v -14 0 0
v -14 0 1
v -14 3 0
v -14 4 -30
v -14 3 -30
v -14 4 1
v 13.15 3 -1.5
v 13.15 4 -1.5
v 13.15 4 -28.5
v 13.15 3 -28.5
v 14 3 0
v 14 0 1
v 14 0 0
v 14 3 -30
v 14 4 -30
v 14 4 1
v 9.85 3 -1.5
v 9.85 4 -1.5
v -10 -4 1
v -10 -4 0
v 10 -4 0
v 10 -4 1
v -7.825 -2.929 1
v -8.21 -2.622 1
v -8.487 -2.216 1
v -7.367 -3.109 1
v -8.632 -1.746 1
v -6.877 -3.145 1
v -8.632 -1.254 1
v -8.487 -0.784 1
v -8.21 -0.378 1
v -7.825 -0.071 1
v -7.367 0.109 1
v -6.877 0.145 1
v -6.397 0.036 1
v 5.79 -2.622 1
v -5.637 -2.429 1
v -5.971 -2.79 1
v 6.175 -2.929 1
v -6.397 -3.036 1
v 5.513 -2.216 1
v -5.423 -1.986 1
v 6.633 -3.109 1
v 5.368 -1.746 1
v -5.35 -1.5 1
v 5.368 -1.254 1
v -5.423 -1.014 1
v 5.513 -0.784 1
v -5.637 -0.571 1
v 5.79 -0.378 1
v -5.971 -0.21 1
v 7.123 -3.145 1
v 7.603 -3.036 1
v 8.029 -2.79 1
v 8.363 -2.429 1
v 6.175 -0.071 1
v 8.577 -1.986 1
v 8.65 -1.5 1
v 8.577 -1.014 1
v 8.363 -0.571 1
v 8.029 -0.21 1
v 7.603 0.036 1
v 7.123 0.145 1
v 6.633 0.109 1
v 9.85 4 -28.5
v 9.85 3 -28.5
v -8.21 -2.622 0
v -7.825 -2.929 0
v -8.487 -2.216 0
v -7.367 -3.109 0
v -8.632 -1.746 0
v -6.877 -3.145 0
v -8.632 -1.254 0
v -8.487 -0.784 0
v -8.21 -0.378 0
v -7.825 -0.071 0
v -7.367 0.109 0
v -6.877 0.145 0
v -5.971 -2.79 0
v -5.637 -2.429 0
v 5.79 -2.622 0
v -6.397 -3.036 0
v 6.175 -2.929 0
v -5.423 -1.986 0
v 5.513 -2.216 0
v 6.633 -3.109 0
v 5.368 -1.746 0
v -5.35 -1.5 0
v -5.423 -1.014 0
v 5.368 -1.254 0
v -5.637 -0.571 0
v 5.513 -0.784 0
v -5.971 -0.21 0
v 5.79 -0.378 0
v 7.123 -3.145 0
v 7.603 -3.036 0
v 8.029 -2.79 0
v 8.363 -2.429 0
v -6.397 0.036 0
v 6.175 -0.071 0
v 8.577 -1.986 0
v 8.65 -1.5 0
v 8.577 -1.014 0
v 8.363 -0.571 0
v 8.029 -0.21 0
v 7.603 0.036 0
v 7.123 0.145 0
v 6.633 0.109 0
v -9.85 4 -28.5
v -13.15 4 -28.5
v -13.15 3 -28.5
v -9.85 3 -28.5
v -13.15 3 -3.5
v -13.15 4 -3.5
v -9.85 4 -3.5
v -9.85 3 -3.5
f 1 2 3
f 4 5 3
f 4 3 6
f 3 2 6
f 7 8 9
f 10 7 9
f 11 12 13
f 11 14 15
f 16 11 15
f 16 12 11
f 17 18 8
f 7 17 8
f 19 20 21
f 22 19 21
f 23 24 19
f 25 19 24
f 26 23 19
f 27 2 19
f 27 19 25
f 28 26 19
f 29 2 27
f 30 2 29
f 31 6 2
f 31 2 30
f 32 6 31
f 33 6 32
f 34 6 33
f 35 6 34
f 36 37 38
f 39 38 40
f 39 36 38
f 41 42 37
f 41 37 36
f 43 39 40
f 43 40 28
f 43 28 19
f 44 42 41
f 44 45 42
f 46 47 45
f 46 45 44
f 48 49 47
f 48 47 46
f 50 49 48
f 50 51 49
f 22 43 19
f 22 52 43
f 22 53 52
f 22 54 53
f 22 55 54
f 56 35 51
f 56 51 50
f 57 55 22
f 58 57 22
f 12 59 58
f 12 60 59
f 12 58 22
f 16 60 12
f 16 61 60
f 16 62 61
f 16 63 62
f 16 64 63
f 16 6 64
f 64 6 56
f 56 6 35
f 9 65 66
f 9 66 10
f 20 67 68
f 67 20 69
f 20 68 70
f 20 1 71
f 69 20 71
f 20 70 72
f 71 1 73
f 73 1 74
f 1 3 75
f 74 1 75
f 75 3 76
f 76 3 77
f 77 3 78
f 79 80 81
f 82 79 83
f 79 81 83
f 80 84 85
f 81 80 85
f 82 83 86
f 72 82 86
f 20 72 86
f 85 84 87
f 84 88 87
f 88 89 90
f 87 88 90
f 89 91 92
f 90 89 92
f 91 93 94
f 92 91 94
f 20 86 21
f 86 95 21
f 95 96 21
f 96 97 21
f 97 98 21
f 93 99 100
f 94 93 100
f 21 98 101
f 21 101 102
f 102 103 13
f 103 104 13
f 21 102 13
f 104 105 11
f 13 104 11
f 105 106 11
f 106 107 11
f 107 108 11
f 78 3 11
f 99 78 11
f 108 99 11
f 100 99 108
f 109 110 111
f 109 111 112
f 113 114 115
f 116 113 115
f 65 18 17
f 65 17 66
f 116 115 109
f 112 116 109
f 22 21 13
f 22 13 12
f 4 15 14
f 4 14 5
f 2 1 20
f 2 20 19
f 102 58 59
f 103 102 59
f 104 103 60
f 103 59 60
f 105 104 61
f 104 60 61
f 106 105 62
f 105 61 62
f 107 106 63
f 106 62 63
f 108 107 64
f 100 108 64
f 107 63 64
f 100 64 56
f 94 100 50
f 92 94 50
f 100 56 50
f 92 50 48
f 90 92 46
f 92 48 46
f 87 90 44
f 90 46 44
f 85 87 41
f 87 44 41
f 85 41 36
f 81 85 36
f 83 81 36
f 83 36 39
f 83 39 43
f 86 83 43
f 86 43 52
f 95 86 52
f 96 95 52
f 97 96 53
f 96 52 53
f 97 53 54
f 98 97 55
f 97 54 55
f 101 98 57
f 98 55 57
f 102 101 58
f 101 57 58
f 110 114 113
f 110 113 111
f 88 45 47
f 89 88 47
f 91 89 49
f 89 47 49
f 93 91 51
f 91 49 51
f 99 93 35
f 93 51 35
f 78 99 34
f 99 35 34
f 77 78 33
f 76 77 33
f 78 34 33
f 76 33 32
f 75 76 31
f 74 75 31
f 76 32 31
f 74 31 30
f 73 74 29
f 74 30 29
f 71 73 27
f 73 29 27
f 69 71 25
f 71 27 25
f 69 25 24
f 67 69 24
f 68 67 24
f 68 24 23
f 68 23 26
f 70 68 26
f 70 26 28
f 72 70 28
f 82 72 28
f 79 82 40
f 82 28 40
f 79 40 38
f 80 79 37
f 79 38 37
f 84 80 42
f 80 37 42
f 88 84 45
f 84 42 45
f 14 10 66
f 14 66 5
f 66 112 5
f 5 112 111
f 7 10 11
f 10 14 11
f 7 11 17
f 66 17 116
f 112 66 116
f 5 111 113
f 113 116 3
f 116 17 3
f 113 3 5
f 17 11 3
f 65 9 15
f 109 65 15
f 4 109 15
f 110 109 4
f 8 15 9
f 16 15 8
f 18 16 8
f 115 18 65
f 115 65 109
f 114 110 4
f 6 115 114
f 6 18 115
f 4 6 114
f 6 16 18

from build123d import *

# Parameters (mm, degrees)
SKETCH1_W           = 28
SKETCH1_H           = 8
BOSS_EXTRUDE1_DEPTH = 1
SKETCH2_W           = 28
SKETCH2_H           = 1
BOSS_EXTRUDE2_DEPTH = 30
SKETCH3_R           = 1.65
CUT_EXTRUDE1_DEPTH  = 1
CHAMFER1_SIZE       = 4
SKETCH4_W           = 3.3
SKETCH4_H           = 27
SKETCH4_H_2         = 25
CUT_EXTRUDE2_DEPTH  = 10


with BuildPart() as part:
    # Sketch1 → Boss-Extrude1 (new body)
    with BuildSketch(Plane.XY):
        Rectangle(SKETCH1_W, SKETCH1_H)
    extrude(amount=BOSS_EXTRUDE1_DEPTH)

    # Sketch2 → Boss-Extrude2 (add)
    with BuildSketch(Plane(origin=(0, 0, 0), x_dir=(-1, 0, 0), z_dir=(0, 0, -1))):
        with Locations((0, 3.5)):
            Rectangle(SKETCH2_W, SKETCH2_H)
    extrude(amount=BOSS_EXTRUDE2_DEPTH)

    # Sketch3 → Cut-Extrude1 (cut)
    with BuildSketch(Plane.XY.offset(1)):
        with Locations((-7, -1.5)):
            Circle(SKETCH3_R)
        with Locations((7, -1.5)):
            Circle(SKETCH3_R)
    extrude(amount=-CUT_EXTRUDE1_DEPTH, mode=Mode.SUBTRACT)

    # Chamfer1
    chamfer1_edges = [part.edges().sort_by_distance(p)[0] for p in [
        (14, -4, 0.5),
        (-14, -4, 0.5),
    ]]
    chamfer(chamfer1_edges, length=CHAMFER1_SIZE)

    # Sketch4 → Cut-Extrude2 (cut)
    with BuildSketch(Plane(origin=(0, 4, 0), x_dir=(1, 0, 0), z_dir=(0, 1, 0))):
        with Locations((11.5, 15)):
            Rectangle(SKETCH4_W, SKETCH4_H)
        with Locations((-11.5, 16)):
            Rectangle(SKETCH4_W, SKETCH4_H_2)
    extrude(amount=-CUT_EXTRUDE2_DEPTH, mode=Mode.SUBTRACT)


solid = part.part
